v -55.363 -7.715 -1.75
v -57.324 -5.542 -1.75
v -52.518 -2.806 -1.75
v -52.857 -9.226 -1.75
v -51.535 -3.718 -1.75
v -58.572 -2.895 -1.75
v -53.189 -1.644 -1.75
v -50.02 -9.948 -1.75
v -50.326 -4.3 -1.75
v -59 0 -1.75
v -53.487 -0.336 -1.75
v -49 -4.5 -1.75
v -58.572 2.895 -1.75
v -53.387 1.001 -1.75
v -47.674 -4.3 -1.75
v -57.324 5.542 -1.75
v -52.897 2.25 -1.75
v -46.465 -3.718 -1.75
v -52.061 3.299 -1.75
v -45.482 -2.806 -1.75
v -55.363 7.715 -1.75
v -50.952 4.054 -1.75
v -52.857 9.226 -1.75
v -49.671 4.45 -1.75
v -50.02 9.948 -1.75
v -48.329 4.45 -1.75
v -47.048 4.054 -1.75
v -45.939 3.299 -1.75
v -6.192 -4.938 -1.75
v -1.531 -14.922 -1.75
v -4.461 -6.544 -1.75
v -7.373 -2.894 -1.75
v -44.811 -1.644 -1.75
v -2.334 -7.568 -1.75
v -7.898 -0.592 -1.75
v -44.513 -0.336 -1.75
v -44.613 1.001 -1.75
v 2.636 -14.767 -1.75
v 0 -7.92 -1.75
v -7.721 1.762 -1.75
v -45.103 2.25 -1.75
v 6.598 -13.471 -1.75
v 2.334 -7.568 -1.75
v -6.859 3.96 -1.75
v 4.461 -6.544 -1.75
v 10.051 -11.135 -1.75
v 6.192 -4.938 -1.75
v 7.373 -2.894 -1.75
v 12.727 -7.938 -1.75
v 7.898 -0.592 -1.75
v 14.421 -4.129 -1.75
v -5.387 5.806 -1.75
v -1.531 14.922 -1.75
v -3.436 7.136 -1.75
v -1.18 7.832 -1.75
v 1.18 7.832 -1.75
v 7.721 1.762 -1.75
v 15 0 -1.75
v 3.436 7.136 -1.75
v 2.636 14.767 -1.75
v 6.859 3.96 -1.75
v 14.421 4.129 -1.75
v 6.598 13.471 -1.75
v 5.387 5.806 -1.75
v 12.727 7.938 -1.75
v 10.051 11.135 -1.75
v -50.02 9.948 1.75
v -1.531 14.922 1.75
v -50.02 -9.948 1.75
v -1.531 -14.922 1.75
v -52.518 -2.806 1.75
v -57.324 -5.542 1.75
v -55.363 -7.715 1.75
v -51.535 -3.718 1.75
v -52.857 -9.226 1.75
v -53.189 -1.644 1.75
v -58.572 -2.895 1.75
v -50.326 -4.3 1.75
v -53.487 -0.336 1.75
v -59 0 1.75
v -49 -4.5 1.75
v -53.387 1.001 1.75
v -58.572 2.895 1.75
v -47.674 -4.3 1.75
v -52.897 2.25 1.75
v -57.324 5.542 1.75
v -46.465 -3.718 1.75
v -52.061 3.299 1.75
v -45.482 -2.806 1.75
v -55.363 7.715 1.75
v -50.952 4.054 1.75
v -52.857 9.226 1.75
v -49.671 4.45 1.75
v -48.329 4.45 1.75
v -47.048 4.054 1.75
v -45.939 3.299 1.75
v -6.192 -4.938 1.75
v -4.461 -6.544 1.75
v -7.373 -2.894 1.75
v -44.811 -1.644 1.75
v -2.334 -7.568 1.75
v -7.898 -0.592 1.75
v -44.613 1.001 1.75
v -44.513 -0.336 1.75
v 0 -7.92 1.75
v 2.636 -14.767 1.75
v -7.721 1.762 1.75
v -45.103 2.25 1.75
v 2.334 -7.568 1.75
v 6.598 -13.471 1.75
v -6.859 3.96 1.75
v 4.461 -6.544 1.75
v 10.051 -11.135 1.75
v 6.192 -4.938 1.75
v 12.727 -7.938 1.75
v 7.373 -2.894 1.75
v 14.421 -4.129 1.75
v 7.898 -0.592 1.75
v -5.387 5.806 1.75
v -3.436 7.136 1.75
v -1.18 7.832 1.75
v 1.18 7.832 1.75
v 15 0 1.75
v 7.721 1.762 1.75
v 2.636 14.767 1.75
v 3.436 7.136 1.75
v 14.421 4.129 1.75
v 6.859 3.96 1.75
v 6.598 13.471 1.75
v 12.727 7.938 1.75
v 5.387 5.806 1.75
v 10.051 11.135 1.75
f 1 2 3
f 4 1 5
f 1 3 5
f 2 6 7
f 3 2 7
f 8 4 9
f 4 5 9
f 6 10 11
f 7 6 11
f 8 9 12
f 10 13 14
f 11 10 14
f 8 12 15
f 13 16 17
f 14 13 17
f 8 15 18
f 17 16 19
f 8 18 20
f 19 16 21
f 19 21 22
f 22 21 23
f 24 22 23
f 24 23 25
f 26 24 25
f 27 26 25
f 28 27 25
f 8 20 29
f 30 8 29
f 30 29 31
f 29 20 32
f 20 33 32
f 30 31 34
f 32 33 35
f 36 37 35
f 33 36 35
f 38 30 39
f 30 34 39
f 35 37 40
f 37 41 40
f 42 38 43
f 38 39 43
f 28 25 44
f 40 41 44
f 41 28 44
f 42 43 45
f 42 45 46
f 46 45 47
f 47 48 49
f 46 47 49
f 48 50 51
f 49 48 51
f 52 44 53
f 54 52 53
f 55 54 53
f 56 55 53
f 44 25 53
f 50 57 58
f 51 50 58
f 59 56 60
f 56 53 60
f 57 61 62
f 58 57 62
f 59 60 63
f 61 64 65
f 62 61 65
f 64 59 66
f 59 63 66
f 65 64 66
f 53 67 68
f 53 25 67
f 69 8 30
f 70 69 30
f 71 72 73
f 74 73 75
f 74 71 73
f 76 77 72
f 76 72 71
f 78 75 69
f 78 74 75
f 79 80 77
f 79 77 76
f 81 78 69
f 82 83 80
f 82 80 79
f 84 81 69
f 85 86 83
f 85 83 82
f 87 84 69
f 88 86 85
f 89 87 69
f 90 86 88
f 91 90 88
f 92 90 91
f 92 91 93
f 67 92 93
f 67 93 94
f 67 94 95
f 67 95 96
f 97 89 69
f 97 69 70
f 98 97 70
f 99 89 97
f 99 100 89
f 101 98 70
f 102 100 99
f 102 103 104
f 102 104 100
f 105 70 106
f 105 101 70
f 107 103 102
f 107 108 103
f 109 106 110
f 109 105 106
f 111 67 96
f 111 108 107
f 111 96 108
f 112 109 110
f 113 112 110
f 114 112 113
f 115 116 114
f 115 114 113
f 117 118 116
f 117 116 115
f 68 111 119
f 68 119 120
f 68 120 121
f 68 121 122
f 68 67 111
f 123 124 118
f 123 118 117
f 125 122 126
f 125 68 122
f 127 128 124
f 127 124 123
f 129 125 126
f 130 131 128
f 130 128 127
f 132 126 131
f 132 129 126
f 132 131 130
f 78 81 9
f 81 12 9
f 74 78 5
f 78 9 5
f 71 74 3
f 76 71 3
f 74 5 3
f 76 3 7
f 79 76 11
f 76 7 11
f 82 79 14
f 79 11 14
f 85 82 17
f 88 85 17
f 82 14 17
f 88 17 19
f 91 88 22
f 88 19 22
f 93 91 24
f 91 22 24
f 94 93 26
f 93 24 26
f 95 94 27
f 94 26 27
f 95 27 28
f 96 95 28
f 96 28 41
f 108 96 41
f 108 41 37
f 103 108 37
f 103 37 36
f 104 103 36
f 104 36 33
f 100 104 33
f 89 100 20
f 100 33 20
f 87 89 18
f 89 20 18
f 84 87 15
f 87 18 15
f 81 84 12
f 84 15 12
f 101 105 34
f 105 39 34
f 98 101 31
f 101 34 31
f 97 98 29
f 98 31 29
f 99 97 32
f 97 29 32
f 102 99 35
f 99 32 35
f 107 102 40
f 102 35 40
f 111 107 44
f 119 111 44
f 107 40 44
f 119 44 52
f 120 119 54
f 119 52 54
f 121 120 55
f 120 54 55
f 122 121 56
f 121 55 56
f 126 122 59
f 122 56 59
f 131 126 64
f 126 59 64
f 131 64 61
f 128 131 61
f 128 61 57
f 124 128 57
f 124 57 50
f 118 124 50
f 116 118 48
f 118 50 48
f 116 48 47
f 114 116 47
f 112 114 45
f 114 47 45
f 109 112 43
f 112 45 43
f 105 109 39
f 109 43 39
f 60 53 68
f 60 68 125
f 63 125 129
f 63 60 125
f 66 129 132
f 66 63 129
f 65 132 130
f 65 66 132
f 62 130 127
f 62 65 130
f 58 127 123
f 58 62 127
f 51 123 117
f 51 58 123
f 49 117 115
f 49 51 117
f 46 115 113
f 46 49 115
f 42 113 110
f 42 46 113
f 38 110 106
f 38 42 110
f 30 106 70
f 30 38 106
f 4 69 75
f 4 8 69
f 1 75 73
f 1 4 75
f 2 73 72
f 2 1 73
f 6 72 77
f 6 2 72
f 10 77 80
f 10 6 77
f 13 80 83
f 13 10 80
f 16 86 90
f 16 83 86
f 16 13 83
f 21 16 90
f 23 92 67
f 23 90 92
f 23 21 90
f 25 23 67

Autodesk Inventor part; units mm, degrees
ref_plane "YZ Plane" through (0, 0, 0) normal (1, 0, 0) x (0, 1, 0)
ref_plane "XZ Plane" through (0, 0, 0) normal (0, 1, 0) x (-1, 0, 0)
ref_plane "XY Plane" through (0, 0, 0) normal (0, 0, 1) x (1, 0, 0)
sketch "Sketch1" plane through (0, 0, 0) normal (0, 0, 1) x (1, 0, 0)
  circle A0 centre (0, 0) radius 15
  line L0 (0, 0) -> (-49, 0) construction
  circle A1 centre (-49, 0) radius 10
  line L1 (-50.0204, 9.9478) -> (-1.5306, 14.9217)
  line L2 (-50.0204, -9.9478) -> (-1.5306, -14.9217)
  dimension "d0" = 20
  dimension "d1" = 30
  dimension "d2" = 49
extrude "Extrusion1" add sketch "Sketch1" along normal mid plane 3.5
sketch "Sketch2" plane through (0, 0, 1.75) normal (0, 0, 1) x (1, 0, 0)
  arc A0 (-1.5306, -14.9217) -> (-1.5306, 14.9217) centre (0, 0) ccw projected
hole "Hole1" at (0, 0, 1.75) direction (0, 0, -1) diameter 15.84 end through all
sketch "Sketch3" plane through (0, 0, 1.75) normal (0, 0, 1) x (1, 0, 0)
  arc A0 (-50.0204, 9.9478) -> (-50.0204, -9.9478) centre (-49, 0) ccw projected
hole "Hole2" at (-49, 0, 1.75) direction (0, 0, -1) diameter 9 end through all
properties part number "313-01-02" material "Steel"
